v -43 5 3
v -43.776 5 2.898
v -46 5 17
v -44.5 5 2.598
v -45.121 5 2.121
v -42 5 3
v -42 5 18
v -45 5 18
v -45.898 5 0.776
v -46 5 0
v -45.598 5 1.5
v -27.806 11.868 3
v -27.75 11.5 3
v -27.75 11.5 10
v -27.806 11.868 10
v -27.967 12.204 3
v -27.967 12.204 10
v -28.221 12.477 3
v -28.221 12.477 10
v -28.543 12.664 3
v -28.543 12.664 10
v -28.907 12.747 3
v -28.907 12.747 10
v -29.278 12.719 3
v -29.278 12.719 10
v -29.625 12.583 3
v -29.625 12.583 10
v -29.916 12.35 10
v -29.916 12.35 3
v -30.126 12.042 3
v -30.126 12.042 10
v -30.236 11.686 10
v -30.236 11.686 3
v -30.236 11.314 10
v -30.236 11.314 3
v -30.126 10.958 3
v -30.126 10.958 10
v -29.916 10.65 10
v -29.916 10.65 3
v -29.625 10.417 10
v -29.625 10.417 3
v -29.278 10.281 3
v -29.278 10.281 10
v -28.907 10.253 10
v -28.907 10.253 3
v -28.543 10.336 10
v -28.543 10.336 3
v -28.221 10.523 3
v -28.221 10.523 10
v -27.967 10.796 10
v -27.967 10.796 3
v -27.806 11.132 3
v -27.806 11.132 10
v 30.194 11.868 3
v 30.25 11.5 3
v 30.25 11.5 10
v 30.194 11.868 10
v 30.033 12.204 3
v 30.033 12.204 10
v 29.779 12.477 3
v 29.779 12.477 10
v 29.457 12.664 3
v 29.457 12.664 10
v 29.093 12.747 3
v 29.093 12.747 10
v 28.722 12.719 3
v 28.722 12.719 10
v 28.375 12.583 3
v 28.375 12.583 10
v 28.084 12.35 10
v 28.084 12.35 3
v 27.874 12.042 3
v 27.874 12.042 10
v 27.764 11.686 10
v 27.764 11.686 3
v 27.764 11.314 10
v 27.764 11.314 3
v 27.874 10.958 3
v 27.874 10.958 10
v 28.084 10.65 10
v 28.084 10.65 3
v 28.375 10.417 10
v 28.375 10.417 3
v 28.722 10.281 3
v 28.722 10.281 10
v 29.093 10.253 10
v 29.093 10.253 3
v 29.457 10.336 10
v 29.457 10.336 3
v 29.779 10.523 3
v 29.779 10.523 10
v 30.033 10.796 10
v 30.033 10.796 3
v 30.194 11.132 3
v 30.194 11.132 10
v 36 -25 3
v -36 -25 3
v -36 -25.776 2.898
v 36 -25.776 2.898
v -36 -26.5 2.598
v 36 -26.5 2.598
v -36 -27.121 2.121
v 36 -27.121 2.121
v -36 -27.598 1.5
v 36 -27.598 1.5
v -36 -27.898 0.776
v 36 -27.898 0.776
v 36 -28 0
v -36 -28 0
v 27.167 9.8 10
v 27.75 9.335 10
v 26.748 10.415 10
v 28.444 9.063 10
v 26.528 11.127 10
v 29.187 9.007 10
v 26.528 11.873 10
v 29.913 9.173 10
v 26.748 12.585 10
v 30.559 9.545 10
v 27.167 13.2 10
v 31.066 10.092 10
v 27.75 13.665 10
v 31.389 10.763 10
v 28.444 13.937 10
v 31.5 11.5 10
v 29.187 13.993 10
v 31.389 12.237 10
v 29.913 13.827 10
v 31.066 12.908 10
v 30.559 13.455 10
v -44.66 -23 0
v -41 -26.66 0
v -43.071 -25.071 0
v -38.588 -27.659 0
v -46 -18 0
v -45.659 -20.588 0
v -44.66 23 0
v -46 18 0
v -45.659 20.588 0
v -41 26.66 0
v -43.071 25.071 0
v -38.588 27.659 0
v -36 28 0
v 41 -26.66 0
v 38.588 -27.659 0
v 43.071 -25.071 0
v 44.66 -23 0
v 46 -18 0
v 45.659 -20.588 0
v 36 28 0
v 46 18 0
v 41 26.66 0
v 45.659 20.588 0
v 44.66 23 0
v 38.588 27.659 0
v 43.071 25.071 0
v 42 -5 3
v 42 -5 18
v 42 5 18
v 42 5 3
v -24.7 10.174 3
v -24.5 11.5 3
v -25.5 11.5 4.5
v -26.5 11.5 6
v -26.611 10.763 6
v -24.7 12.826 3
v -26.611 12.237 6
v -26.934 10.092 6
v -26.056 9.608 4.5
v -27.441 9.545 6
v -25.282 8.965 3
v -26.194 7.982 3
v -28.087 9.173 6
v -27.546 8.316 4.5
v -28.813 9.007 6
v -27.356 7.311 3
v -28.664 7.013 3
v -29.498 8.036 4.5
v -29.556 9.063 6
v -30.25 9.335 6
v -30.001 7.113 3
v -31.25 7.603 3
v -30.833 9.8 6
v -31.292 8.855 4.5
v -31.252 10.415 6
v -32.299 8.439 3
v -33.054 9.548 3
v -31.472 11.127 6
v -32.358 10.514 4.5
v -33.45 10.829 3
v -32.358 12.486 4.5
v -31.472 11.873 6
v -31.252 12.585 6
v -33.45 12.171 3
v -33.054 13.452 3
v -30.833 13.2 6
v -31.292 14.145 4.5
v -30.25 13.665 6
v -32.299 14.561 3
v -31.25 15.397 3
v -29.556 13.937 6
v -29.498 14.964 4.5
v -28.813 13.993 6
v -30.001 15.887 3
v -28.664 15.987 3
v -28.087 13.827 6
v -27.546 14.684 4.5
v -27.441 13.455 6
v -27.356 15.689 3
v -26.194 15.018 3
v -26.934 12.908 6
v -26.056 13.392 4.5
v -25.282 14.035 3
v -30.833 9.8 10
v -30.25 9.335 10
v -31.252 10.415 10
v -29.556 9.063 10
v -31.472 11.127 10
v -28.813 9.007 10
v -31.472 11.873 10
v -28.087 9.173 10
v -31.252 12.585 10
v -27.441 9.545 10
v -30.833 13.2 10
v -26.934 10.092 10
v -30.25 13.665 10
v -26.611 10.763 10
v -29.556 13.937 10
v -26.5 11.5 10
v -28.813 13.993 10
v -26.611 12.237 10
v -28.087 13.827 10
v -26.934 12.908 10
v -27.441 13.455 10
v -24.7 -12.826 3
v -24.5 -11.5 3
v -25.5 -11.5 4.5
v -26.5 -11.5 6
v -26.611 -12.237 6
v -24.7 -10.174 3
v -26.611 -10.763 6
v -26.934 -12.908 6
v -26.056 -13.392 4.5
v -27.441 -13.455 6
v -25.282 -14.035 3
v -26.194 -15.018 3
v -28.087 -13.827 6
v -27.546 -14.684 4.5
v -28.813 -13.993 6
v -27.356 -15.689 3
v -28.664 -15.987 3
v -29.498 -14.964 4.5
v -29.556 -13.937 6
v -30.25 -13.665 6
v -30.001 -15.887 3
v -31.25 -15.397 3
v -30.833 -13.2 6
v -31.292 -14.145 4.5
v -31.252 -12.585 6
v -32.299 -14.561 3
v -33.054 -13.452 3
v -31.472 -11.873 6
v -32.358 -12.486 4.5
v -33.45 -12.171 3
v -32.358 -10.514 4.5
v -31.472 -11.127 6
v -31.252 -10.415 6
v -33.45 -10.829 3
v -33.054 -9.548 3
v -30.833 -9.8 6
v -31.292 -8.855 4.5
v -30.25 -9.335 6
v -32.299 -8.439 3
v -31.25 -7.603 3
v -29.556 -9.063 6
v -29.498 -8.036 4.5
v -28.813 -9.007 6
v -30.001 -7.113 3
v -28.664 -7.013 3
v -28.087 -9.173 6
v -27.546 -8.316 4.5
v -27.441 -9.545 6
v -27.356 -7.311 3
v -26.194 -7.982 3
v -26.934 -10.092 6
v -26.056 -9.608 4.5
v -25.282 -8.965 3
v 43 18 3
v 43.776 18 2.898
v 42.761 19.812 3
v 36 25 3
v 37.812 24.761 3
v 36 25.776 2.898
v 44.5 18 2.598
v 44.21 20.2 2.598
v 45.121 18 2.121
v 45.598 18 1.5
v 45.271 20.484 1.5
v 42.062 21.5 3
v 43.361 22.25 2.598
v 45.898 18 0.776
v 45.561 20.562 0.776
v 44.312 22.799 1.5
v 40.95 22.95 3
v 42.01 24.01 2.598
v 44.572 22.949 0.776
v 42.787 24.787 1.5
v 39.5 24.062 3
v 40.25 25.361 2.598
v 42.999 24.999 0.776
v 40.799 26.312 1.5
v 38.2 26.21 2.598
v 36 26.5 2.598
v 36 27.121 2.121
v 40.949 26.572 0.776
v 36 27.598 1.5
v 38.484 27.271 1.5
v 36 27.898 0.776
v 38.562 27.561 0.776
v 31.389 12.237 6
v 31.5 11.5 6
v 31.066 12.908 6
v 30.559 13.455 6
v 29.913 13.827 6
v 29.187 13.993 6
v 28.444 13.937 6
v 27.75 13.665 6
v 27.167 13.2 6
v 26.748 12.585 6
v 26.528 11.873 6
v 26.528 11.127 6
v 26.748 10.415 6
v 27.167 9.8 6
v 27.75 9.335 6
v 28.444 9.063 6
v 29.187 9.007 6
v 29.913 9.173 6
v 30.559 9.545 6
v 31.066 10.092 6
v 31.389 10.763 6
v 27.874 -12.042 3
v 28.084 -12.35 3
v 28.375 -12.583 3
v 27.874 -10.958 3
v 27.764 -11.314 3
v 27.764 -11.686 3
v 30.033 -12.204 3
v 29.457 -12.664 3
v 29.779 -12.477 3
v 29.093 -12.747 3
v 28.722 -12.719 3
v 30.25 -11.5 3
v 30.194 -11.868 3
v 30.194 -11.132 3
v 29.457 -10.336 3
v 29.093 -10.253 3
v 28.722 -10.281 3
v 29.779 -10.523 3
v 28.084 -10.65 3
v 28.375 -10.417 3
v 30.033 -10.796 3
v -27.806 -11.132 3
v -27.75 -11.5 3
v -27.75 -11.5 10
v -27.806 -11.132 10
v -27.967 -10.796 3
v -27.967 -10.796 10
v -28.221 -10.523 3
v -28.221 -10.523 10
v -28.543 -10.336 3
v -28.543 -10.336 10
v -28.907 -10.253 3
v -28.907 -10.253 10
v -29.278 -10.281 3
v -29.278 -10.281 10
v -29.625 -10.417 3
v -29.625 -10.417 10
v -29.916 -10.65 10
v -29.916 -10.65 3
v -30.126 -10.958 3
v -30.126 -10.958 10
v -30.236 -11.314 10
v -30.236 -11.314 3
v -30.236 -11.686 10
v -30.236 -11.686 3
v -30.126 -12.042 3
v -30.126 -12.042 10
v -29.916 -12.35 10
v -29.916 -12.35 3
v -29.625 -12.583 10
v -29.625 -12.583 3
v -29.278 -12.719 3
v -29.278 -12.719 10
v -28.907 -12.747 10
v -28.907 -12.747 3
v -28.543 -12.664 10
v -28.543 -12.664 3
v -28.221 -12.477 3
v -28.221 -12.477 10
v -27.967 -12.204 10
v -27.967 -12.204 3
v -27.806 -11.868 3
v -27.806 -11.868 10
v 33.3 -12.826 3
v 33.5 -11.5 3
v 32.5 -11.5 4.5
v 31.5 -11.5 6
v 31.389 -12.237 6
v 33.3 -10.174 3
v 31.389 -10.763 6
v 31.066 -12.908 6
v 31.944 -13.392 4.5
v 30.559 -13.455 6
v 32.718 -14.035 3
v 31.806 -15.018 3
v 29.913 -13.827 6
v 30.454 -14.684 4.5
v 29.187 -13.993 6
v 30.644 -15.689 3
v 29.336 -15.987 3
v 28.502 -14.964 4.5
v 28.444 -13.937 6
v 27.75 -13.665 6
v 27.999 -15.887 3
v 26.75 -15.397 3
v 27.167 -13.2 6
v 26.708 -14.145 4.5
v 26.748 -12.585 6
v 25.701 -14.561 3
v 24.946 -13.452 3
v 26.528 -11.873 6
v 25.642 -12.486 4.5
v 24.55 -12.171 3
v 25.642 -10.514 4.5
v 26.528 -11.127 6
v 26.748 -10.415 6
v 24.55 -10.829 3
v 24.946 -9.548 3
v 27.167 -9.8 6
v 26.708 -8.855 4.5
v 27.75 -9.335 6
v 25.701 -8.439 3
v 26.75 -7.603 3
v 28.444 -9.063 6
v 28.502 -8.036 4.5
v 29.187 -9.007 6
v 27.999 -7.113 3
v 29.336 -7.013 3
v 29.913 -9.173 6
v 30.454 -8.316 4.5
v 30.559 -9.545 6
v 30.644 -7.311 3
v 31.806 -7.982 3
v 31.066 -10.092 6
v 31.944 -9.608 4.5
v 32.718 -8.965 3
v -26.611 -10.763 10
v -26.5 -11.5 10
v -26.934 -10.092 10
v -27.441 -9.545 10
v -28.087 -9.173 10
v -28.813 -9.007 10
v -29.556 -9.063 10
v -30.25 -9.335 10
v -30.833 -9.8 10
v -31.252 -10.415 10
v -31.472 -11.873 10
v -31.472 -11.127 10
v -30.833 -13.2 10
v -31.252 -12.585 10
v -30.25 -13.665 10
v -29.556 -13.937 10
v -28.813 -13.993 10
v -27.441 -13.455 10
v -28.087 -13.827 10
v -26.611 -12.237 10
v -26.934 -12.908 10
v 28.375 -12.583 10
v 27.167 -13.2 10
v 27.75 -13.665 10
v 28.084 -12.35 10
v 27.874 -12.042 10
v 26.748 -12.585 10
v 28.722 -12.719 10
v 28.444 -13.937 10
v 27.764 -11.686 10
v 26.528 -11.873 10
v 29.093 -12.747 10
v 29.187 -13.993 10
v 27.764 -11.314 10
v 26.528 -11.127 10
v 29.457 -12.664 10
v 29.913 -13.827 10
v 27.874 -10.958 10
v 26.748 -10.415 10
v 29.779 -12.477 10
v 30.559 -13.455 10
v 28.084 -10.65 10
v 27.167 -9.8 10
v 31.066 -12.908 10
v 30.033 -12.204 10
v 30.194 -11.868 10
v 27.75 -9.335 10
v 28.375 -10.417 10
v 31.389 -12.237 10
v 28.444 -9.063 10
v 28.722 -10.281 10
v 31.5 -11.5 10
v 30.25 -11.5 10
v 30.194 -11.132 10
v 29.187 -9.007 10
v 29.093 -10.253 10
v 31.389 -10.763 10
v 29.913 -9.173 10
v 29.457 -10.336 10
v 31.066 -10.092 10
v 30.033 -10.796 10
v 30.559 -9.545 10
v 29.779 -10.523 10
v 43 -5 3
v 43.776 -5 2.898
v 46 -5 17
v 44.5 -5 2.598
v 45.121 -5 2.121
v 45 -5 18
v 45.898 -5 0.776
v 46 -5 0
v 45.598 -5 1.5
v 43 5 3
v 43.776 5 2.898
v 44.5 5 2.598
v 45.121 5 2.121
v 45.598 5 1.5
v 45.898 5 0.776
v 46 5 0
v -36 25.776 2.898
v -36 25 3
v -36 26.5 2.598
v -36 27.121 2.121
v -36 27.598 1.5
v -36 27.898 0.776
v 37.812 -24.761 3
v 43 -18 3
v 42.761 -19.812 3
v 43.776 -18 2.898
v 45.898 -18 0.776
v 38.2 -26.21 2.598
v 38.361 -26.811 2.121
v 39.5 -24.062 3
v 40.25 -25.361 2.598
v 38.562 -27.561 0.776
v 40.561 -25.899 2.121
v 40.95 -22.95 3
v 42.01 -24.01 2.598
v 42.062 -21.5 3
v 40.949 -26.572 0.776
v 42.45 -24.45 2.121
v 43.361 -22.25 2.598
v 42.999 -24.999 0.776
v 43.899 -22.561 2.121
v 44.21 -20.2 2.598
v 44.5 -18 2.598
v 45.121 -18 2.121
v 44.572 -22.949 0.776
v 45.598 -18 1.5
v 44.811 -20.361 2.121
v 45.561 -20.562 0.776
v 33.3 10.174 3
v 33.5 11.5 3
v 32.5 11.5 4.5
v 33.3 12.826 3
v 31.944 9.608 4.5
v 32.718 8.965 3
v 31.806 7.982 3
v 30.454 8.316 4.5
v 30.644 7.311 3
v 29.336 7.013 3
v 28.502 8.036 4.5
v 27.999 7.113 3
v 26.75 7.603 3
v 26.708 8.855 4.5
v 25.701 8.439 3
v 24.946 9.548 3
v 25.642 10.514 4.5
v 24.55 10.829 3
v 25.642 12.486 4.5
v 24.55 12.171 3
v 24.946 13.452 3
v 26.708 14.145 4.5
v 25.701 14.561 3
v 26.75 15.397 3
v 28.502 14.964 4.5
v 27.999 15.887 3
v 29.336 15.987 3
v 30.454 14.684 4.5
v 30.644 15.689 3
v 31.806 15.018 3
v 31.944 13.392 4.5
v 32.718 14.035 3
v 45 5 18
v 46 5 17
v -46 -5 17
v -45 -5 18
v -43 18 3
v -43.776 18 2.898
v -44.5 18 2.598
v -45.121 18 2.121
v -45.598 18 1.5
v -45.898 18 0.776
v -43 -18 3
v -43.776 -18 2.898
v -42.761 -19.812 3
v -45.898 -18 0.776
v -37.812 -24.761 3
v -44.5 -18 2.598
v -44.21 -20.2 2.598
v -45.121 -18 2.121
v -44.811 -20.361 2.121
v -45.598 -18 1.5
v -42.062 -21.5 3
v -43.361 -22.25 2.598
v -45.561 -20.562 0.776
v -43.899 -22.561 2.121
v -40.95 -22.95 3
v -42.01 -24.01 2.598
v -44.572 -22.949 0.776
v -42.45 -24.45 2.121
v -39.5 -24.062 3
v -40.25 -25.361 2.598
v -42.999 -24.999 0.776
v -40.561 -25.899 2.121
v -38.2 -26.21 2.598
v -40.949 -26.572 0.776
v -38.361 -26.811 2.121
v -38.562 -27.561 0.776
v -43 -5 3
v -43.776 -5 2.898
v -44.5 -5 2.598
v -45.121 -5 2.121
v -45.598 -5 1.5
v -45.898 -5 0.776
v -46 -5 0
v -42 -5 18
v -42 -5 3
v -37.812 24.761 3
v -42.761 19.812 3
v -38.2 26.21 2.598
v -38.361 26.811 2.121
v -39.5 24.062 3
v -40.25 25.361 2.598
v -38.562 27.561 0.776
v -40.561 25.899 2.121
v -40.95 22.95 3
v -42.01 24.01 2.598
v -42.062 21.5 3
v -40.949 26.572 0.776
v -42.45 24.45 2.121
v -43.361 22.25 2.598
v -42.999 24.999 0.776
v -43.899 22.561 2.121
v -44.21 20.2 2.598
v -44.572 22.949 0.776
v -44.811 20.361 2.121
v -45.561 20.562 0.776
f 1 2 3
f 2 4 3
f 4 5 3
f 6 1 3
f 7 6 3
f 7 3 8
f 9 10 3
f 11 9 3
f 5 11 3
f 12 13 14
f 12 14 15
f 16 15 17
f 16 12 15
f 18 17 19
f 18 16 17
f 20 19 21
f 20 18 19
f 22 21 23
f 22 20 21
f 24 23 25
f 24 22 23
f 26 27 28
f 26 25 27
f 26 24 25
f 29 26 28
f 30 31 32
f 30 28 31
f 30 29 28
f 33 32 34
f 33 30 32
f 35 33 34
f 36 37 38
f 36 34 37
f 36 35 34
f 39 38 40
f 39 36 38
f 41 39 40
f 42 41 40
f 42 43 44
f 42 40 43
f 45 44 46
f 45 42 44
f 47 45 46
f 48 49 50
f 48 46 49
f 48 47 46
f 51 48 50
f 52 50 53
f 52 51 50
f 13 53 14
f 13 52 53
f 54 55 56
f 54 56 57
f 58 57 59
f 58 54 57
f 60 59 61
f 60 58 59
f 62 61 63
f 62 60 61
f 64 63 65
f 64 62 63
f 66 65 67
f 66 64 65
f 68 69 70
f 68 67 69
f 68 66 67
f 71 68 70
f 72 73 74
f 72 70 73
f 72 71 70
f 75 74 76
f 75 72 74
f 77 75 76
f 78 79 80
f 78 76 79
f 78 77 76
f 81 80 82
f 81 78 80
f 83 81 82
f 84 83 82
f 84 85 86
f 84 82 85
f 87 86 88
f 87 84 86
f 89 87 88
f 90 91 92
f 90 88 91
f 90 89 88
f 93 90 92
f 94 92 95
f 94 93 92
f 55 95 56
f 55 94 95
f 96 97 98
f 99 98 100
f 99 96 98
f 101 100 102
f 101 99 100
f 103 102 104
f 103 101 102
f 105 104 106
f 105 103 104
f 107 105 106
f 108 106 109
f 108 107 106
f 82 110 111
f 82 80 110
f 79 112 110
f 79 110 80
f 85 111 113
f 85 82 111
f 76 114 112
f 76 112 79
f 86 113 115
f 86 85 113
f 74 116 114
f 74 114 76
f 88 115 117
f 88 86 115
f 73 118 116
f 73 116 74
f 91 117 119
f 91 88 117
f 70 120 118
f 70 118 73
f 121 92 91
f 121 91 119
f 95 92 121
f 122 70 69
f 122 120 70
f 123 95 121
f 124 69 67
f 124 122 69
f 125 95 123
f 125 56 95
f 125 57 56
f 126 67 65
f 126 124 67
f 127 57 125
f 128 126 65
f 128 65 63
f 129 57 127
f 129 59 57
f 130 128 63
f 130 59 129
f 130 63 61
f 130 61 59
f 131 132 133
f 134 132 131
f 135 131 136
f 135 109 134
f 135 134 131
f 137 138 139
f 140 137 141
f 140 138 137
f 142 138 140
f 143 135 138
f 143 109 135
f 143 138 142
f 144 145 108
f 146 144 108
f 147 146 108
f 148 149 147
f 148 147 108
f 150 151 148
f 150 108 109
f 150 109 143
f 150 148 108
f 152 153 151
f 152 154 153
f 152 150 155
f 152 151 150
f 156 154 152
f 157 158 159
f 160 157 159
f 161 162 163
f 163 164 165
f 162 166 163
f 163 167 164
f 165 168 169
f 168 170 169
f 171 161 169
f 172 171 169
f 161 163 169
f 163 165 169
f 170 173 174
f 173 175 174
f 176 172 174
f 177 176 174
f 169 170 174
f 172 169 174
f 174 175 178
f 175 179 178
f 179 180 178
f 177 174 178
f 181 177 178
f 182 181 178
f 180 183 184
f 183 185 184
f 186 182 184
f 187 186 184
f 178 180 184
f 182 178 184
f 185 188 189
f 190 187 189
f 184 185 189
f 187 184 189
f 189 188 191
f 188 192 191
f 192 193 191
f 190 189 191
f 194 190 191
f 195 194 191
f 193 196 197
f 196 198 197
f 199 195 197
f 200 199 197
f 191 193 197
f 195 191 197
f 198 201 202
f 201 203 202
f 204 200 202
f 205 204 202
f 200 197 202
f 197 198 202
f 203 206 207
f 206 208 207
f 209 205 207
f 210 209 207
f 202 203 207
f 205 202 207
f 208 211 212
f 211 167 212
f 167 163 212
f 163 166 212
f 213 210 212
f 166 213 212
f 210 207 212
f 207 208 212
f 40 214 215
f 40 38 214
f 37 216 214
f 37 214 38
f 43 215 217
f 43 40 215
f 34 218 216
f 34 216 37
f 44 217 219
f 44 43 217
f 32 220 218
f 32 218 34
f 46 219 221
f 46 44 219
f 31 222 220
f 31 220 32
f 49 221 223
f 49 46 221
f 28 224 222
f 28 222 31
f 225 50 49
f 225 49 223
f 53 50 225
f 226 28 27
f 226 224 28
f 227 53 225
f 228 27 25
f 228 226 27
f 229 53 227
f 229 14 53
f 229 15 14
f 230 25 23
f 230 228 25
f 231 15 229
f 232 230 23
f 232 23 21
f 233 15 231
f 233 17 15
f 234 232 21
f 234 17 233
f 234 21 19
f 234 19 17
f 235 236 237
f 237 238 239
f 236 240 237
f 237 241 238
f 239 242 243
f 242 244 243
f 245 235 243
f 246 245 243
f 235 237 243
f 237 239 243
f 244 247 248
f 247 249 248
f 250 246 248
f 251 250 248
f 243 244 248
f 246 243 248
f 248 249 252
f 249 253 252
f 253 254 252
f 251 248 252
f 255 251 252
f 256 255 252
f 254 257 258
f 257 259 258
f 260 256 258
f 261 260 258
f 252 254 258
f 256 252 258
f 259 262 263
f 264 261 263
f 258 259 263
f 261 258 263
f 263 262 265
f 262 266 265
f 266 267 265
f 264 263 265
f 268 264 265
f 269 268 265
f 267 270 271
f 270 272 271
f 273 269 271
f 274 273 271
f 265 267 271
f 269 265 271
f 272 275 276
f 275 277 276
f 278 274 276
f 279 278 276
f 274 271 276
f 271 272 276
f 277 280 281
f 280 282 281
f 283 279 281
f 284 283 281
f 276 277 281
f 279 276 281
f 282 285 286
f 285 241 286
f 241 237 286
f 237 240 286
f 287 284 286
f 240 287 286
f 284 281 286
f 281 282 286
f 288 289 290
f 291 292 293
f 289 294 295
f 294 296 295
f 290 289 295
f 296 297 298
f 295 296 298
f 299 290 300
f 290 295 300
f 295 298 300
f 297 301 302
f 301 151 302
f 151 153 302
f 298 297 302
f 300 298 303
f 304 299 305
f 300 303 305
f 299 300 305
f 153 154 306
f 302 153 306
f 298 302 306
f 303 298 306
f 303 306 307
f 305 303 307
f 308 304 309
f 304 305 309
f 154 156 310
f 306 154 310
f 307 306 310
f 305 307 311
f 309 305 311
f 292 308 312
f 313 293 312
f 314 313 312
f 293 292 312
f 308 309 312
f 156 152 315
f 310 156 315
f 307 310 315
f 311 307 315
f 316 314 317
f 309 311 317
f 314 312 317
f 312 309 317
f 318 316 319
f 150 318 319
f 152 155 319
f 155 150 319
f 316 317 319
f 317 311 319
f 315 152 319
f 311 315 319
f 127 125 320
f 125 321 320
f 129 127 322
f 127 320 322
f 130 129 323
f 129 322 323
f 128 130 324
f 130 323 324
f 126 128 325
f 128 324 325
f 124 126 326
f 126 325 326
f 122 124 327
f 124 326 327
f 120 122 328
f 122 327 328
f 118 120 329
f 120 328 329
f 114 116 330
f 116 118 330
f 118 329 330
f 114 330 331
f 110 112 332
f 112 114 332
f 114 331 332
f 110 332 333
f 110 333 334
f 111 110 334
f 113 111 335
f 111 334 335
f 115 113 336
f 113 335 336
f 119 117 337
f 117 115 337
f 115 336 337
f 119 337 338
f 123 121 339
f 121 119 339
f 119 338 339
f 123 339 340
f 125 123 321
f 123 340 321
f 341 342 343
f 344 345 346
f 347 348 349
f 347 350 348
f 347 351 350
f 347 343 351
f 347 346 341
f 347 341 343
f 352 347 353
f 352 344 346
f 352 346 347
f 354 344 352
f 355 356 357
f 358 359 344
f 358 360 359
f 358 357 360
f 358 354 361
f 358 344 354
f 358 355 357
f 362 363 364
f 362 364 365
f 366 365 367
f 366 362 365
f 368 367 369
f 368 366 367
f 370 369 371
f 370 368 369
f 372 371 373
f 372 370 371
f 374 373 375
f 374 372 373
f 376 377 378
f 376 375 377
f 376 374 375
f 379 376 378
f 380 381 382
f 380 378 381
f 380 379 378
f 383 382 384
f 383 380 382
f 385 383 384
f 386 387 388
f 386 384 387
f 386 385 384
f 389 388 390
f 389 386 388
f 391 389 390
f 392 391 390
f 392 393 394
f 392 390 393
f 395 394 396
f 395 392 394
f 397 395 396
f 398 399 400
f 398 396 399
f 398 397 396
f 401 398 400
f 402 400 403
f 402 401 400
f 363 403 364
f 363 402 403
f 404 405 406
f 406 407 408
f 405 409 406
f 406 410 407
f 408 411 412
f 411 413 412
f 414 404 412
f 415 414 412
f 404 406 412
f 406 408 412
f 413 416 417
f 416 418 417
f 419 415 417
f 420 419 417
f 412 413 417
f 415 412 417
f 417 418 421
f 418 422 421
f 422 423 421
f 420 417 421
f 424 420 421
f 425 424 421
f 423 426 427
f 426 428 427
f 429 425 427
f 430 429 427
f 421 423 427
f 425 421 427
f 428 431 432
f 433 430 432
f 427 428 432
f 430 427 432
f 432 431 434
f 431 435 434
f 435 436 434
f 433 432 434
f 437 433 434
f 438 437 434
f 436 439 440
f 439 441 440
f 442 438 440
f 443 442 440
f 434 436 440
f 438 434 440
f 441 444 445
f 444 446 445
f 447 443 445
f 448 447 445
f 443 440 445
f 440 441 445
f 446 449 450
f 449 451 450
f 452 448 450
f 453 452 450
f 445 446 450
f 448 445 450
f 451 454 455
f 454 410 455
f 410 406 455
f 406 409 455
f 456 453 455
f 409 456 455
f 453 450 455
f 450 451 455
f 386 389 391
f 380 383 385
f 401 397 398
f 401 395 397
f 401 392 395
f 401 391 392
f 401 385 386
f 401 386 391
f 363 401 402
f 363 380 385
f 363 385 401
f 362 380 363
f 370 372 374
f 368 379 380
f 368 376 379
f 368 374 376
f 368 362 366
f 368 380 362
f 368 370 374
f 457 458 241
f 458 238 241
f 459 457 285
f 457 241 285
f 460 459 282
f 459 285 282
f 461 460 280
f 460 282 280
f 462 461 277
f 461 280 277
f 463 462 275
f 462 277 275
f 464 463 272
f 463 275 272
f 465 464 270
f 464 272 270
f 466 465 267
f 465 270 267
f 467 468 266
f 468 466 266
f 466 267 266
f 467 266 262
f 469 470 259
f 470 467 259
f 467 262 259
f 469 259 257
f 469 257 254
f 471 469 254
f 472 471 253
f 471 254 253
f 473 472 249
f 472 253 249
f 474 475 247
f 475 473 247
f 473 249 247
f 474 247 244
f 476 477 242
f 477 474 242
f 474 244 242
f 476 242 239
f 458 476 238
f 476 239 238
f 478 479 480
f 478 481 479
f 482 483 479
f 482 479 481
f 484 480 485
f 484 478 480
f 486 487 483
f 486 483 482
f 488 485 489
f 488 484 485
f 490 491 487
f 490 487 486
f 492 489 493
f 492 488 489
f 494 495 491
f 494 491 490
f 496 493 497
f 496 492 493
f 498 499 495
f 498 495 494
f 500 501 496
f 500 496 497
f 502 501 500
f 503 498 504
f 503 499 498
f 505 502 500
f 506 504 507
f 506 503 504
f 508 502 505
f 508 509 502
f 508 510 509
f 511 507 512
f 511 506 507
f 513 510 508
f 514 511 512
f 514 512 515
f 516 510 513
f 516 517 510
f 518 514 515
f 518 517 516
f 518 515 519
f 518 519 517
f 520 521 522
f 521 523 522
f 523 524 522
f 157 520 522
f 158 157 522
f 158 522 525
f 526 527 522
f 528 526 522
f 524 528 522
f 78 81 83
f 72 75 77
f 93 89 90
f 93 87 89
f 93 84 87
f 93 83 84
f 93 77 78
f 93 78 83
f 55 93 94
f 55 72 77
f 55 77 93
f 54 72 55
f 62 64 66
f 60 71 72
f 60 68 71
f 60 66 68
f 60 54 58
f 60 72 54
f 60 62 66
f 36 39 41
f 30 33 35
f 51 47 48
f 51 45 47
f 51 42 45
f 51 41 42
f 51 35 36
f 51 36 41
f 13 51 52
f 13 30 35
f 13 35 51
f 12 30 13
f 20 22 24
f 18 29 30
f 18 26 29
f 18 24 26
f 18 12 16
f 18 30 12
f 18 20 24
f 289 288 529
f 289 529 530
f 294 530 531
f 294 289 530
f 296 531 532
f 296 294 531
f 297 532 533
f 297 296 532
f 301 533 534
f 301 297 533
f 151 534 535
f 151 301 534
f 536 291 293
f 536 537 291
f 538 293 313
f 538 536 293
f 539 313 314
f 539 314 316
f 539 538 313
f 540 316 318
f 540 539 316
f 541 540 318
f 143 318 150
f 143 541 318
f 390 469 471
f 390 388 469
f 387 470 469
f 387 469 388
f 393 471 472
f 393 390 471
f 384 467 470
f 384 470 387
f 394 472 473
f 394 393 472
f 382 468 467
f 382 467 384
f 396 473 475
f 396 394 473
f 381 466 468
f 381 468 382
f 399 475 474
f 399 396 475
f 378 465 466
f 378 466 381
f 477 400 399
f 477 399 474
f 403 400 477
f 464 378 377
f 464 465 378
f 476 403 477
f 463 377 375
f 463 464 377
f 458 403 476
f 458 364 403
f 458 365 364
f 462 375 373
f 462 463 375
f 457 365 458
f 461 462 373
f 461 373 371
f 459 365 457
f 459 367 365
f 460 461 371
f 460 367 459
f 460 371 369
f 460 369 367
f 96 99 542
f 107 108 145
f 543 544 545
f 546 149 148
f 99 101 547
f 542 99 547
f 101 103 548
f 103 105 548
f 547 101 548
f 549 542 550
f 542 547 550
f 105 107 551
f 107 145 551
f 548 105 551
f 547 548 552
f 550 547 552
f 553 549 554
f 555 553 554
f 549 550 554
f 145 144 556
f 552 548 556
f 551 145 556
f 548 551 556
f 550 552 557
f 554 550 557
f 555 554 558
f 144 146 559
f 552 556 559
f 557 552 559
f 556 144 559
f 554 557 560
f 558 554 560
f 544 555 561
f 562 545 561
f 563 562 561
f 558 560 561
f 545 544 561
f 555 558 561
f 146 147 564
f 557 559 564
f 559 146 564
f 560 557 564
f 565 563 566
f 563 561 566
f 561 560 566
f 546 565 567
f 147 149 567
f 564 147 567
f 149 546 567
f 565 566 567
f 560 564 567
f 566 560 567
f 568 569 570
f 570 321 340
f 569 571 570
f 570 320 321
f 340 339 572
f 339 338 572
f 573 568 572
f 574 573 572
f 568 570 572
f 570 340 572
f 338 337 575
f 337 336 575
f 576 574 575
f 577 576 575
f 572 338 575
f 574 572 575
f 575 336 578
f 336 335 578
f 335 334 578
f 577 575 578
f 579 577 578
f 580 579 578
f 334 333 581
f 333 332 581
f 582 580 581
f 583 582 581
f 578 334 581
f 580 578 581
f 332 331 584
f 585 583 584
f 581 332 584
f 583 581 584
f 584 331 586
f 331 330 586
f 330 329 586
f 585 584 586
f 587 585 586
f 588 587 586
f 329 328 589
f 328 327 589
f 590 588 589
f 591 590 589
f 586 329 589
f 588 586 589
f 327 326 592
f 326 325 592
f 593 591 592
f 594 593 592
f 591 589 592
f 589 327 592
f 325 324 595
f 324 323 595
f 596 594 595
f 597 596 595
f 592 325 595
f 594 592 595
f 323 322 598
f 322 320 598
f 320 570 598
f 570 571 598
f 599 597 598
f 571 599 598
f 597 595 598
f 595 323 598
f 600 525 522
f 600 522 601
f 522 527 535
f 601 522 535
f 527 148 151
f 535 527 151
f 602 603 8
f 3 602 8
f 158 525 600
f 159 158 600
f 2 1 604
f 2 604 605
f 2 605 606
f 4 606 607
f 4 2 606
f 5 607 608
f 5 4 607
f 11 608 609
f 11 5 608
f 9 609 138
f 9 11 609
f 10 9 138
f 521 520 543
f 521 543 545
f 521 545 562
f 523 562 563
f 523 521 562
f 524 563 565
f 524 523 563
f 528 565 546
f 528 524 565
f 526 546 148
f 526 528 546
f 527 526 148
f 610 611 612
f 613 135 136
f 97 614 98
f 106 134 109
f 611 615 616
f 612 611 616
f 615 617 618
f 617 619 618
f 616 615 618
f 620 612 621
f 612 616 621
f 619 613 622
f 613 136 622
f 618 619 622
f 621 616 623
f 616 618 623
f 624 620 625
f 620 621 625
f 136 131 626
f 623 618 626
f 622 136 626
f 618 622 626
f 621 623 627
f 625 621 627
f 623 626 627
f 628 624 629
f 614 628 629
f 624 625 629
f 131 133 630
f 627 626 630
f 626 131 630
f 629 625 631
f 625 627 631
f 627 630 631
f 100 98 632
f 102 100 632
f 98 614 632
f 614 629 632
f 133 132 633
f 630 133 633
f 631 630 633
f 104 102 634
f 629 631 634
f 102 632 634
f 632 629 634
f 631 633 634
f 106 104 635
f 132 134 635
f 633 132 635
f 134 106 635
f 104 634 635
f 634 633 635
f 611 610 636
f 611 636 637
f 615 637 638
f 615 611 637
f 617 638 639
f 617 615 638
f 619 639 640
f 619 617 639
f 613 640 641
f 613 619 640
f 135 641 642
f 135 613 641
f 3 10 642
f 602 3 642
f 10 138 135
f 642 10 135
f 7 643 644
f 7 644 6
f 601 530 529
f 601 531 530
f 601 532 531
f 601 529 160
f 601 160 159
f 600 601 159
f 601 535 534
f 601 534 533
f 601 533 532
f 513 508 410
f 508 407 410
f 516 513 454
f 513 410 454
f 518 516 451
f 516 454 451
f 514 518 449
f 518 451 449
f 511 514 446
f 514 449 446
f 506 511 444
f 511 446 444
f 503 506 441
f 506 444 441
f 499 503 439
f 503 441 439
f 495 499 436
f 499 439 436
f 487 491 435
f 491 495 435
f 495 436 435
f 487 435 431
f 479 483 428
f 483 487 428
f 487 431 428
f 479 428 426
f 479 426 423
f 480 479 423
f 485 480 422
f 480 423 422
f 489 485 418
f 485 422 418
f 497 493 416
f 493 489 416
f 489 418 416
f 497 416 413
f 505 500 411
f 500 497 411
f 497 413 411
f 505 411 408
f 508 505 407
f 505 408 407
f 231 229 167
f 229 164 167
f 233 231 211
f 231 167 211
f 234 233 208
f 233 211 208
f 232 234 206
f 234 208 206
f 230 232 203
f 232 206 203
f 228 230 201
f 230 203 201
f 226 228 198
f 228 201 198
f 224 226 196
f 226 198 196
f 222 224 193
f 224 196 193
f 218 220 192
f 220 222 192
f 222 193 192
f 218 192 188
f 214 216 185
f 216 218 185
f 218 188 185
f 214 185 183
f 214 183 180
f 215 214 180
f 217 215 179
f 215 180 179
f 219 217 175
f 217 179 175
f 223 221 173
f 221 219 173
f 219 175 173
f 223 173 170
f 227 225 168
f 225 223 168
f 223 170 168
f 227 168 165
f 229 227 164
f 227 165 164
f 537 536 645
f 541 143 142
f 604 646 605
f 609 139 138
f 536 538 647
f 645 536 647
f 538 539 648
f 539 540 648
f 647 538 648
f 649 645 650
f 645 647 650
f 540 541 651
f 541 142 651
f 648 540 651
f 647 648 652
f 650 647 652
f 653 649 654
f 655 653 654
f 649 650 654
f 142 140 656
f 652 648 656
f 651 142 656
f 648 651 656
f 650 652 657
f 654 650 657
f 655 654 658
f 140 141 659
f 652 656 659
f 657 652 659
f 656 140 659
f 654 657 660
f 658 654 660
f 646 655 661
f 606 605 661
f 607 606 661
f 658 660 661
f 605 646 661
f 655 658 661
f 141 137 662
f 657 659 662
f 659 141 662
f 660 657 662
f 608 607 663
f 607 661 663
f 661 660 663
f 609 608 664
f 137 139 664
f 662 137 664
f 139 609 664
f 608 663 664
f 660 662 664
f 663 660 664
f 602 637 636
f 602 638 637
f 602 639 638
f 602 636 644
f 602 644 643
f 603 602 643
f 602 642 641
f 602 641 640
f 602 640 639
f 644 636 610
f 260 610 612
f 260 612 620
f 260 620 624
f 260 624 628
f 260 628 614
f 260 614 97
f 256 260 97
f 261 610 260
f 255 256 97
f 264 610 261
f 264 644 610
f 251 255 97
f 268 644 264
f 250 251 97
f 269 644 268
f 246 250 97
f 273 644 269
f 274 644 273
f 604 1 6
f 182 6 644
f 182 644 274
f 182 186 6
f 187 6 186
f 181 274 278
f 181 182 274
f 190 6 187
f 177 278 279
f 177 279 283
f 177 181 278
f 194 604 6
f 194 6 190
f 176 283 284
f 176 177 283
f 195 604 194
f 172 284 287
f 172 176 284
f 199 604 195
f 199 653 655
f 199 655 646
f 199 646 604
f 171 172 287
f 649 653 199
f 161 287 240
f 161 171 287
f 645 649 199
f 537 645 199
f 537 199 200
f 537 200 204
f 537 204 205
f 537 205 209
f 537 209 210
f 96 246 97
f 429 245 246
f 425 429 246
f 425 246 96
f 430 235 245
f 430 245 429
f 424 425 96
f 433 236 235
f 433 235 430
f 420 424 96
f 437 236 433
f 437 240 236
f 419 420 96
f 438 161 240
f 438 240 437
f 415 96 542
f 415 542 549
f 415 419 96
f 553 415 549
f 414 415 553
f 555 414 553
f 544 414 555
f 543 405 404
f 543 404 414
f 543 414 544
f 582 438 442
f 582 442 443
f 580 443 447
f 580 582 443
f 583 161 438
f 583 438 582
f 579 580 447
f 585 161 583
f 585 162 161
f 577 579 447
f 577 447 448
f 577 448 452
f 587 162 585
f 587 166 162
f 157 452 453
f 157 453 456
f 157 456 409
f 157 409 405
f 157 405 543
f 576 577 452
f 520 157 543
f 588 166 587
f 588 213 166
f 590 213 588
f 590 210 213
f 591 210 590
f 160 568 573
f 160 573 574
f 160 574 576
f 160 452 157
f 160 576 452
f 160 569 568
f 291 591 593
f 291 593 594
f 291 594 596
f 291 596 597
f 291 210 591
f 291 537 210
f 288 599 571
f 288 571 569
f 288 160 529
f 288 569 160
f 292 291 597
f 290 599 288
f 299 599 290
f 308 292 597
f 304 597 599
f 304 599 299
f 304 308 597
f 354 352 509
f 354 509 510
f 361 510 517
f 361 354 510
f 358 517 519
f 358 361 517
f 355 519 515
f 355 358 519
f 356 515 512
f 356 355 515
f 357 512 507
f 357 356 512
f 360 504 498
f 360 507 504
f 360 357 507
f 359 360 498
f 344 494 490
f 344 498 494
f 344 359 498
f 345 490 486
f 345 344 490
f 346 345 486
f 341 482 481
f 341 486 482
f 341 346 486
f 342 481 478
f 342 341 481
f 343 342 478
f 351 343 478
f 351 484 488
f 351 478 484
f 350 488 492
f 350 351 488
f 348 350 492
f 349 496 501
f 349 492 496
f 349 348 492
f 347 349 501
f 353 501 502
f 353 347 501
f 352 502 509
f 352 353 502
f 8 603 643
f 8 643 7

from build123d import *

# Parameters (mm, degrees)
F2_DEPTH = 3
F1_R     = 2.5
F1_R_2   = 1.25
F3_DEPTH = 10
F4_SIZE2 = 3
F4_SIZE  = 2
F5_R     = 2.99999
F7_W     = 10
F7_H     = 18
F8_DEPTH = 4
F10_SIZE = 1


# Not quite as in the source:
# - a fillet or chamfer is up to 0.001 mm smaller than in the source, because OpenCascade refuses the exact size


with BuildPart() as f2:
    # F0 (on Top) → F2 (new body)
    with BuildSketch(Plane.XY):
        with BuildLine():
            ThreePointArc((46, 18), (43.0710678119, 25.0710678119), (36, 28))
            Line((36, 28), (-36, 28))
            ThreePointArc((-36, 28), (-43.0710678119, 25.0710678119), (-46, 18))
            Line((-46, 18), (-46, -18))
            ThreePointArc((-46, -18), (-43.0710678119, -25.0710678119), (-36, -28))
            Line((-36, -28), (36, -28))
            ThreePointArc((36, -28), (43.0710678119, -25.0710678119), (46, -18))
            Line((46, -18), (46, 18))
        make_face()
    extrude(amount=F2_DEPTH)

    # F1 (on Top) → F3 (join)
    with BuildSketch(Plane.XY):
        with Locations((-29, 11.5)):
            Circle(F1_R)
        with Locations((-29, 11.5)):
            Circle(F1_R_2, mode=Mode.SUBTRACT)
        with Locations((29, 11.5)):
            Circle(F1_R)
        with Locations((29, 11.5)):
            Circle(F1_R_2, mode=Mode.SUBTRACT)
        with Locations((-29, -11.5)):
            Circle(F1_R)
        with Locations((-29, -11.5)):
            Circle(F1_R_2, mode=Mode.SUBTRACT)
        with Locations((29, -11.5)):
            Circle(F1_R)
        with Locations((29, -11.5)):
            Circle(F1_R_2, mode=Mode.SUBTRACT)
    extrude(amount=F3_DEPTH)

    # F4
    f4_edges = [f2.edges().sort_by_distance(p)[0] for p in [
        (-31.5, 11.5, 3),
        (26.5, 11.5, 3),
        (26.5, -11.5, 3),
        (-31.5, -11.5, 3),
    ]]
    chamfer(f4_edges, length=F4_SIZE, length2=F4_SIZE2)

    # F5 (radius 3 in the source; OpenCascade refuses exactly that, so slightly less here)
    f5_edges = [f2.edges().sort_by_distance(p)[0] for p in [
        (0, 28, 3),
    ]]
    fillet(f5_edges, radius=F5_R)

    # F7 (on offset) → F8 (join)
    with BuildSketch(Plane.YZ.offset(46)):
        with Locations((0, 9)):
            Rectangle(F7_W, F7_H)
    extrude(amount=-F8_DEPTH)

    # F9: F2 across plane


with BuildPart() as f2_1:
    add(f2.part)
    add(f2.part.mirror(Plane.YZ))

    # F10
    f10_edges = [f2_1.edges().sort_by_distance(p)[0] for p in [
        (-46, 0, 18),
        (46, 0, 18),
    ]]
    chamfer(f10_edges, length=F10_SIZE)


solid = f2_1.part
